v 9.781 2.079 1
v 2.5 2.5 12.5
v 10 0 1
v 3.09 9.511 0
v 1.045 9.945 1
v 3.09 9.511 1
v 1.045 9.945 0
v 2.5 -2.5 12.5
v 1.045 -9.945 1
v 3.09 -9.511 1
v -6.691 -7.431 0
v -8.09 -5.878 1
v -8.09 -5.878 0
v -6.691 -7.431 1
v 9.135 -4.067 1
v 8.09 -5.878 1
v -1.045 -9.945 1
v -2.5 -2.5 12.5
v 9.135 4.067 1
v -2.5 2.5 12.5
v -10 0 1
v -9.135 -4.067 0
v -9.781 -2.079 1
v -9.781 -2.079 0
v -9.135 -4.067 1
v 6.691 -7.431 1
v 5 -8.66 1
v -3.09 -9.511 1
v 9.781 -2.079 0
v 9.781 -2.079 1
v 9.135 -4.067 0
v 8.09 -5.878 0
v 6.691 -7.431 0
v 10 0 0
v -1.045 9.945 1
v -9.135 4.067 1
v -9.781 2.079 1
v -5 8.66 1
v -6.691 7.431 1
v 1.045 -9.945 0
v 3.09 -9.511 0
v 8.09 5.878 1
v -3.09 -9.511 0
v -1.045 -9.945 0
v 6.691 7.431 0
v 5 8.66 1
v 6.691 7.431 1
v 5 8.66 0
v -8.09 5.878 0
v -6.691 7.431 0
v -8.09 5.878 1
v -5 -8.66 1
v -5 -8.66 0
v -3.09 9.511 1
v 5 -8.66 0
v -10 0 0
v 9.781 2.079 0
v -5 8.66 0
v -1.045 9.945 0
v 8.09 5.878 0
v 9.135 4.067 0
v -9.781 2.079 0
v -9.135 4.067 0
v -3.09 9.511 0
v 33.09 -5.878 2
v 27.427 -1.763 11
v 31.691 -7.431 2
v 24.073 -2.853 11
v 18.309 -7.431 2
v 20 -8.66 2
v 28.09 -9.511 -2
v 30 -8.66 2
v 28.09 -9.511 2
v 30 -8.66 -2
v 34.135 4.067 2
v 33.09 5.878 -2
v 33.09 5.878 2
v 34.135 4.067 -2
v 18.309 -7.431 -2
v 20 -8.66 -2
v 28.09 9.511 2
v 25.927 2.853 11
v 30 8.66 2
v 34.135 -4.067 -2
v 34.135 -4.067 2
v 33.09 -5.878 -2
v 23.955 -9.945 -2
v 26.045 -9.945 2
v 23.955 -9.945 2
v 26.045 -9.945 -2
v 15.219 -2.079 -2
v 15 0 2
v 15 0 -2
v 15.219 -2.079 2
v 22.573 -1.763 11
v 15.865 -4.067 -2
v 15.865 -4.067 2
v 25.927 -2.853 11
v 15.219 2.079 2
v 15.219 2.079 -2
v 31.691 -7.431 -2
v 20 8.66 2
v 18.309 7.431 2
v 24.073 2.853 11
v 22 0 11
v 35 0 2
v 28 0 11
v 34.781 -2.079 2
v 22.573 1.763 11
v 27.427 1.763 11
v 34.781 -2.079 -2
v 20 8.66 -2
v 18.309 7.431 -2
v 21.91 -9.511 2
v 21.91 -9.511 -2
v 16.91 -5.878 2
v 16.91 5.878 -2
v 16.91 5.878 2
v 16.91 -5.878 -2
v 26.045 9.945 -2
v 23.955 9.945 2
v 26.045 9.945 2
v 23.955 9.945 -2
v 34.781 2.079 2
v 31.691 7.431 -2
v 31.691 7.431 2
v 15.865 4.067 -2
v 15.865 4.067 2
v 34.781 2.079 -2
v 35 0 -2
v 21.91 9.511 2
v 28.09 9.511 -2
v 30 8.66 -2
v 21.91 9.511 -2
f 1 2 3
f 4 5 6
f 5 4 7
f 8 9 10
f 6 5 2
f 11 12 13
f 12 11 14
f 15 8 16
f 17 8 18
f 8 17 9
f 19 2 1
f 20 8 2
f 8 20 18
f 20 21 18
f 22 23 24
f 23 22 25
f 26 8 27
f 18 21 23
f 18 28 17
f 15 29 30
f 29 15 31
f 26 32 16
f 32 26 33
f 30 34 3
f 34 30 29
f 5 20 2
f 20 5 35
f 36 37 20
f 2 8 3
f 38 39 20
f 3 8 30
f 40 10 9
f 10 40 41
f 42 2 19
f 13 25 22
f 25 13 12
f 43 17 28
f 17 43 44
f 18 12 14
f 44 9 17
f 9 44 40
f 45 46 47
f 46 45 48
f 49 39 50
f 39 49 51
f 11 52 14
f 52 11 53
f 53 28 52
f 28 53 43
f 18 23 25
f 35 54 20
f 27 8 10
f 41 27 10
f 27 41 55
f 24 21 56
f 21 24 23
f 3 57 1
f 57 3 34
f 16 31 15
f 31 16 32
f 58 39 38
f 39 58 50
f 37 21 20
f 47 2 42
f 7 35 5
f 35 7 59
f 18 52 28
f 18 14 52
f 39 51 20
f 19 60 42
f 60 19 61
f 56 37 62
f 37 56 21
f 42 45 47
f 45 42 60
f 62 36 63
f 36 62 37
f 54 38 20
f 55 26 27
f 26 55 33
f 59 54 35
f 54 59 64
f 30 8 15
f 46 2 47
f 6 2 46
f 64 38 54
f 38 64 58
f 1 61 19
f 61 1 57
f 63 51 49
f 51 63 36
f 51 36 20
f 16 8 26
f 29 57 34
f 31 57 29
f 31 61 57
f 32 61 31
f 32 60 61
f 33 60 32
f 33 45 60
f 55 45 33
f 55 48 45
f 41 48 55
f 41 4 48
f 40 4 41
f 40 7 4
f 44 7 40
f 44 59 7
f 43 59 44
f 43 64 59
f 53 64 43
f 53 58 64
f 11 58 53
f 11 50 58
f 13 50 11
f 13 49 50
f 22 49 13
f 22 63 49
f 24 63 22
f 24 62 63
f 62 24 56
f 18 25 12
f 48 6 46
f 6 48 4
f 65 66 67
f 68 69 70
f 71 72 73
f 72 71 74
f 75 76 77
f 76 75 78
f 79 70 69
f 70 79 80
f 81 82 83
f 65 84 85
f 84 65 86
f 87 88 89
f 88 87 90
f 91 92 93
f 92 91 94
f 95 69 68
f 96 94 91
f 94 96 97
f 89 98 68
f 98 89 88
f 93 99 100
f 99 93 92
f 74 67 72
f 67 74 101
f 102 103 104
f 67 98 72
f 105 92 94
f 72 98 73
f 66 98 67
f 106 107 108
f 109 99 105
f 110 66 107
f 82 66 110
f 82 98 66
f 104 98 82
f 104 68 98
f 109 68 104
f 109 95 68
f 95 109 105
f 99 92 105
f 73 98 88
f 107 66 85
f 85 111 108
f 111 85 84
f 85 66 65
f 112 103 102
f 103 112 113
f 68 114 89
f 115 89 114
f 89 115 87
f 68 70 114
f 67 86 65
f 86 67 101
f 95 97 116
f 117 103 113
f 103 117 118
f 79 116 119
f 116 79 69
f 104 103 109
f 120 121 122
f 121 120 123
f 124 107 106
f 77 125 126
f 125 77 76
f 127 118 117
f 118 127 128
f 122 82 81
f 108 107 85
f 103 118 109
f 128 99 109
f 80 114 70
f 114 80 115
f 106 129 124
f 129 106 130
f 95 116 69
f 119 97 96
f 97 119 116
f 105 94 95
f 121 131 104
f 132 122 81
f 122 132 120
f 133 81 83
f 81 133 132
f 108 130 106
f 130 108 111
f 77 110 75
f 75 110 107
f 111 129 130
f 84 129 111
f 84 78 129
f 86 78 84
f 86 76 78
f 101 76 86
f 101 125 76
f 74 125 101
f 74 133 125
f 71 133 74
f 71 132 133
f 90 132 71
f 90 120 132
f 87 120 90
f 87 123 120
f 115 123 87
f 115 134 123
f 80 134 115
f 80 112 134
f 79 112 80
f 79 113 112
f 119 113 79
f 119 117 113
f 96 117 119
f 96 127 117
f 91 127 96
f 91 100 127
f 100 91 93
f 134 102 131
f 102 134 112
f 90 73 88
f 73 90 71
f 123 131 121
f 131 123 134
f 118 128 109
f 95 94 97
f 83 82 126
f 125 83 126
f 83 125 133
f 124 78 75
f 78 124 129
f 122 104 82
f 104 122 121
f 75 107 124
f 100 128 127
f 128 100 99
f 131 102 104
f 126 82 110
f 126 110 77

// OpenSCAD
// Empty
hull();
// No children
hull() { }

hull() {
  cylinder(r=10, h=1);
  translate([0,0,10]) cube([5,5,5], center=true);
}

translate([25,0,0]) hull() {
  translate([0,0,10]) cylinder(r=3);
  difference() {
    cylinder(r=10, h=4, center=true);
    cylinder(r=5, h=5, center=true);
  }
}
